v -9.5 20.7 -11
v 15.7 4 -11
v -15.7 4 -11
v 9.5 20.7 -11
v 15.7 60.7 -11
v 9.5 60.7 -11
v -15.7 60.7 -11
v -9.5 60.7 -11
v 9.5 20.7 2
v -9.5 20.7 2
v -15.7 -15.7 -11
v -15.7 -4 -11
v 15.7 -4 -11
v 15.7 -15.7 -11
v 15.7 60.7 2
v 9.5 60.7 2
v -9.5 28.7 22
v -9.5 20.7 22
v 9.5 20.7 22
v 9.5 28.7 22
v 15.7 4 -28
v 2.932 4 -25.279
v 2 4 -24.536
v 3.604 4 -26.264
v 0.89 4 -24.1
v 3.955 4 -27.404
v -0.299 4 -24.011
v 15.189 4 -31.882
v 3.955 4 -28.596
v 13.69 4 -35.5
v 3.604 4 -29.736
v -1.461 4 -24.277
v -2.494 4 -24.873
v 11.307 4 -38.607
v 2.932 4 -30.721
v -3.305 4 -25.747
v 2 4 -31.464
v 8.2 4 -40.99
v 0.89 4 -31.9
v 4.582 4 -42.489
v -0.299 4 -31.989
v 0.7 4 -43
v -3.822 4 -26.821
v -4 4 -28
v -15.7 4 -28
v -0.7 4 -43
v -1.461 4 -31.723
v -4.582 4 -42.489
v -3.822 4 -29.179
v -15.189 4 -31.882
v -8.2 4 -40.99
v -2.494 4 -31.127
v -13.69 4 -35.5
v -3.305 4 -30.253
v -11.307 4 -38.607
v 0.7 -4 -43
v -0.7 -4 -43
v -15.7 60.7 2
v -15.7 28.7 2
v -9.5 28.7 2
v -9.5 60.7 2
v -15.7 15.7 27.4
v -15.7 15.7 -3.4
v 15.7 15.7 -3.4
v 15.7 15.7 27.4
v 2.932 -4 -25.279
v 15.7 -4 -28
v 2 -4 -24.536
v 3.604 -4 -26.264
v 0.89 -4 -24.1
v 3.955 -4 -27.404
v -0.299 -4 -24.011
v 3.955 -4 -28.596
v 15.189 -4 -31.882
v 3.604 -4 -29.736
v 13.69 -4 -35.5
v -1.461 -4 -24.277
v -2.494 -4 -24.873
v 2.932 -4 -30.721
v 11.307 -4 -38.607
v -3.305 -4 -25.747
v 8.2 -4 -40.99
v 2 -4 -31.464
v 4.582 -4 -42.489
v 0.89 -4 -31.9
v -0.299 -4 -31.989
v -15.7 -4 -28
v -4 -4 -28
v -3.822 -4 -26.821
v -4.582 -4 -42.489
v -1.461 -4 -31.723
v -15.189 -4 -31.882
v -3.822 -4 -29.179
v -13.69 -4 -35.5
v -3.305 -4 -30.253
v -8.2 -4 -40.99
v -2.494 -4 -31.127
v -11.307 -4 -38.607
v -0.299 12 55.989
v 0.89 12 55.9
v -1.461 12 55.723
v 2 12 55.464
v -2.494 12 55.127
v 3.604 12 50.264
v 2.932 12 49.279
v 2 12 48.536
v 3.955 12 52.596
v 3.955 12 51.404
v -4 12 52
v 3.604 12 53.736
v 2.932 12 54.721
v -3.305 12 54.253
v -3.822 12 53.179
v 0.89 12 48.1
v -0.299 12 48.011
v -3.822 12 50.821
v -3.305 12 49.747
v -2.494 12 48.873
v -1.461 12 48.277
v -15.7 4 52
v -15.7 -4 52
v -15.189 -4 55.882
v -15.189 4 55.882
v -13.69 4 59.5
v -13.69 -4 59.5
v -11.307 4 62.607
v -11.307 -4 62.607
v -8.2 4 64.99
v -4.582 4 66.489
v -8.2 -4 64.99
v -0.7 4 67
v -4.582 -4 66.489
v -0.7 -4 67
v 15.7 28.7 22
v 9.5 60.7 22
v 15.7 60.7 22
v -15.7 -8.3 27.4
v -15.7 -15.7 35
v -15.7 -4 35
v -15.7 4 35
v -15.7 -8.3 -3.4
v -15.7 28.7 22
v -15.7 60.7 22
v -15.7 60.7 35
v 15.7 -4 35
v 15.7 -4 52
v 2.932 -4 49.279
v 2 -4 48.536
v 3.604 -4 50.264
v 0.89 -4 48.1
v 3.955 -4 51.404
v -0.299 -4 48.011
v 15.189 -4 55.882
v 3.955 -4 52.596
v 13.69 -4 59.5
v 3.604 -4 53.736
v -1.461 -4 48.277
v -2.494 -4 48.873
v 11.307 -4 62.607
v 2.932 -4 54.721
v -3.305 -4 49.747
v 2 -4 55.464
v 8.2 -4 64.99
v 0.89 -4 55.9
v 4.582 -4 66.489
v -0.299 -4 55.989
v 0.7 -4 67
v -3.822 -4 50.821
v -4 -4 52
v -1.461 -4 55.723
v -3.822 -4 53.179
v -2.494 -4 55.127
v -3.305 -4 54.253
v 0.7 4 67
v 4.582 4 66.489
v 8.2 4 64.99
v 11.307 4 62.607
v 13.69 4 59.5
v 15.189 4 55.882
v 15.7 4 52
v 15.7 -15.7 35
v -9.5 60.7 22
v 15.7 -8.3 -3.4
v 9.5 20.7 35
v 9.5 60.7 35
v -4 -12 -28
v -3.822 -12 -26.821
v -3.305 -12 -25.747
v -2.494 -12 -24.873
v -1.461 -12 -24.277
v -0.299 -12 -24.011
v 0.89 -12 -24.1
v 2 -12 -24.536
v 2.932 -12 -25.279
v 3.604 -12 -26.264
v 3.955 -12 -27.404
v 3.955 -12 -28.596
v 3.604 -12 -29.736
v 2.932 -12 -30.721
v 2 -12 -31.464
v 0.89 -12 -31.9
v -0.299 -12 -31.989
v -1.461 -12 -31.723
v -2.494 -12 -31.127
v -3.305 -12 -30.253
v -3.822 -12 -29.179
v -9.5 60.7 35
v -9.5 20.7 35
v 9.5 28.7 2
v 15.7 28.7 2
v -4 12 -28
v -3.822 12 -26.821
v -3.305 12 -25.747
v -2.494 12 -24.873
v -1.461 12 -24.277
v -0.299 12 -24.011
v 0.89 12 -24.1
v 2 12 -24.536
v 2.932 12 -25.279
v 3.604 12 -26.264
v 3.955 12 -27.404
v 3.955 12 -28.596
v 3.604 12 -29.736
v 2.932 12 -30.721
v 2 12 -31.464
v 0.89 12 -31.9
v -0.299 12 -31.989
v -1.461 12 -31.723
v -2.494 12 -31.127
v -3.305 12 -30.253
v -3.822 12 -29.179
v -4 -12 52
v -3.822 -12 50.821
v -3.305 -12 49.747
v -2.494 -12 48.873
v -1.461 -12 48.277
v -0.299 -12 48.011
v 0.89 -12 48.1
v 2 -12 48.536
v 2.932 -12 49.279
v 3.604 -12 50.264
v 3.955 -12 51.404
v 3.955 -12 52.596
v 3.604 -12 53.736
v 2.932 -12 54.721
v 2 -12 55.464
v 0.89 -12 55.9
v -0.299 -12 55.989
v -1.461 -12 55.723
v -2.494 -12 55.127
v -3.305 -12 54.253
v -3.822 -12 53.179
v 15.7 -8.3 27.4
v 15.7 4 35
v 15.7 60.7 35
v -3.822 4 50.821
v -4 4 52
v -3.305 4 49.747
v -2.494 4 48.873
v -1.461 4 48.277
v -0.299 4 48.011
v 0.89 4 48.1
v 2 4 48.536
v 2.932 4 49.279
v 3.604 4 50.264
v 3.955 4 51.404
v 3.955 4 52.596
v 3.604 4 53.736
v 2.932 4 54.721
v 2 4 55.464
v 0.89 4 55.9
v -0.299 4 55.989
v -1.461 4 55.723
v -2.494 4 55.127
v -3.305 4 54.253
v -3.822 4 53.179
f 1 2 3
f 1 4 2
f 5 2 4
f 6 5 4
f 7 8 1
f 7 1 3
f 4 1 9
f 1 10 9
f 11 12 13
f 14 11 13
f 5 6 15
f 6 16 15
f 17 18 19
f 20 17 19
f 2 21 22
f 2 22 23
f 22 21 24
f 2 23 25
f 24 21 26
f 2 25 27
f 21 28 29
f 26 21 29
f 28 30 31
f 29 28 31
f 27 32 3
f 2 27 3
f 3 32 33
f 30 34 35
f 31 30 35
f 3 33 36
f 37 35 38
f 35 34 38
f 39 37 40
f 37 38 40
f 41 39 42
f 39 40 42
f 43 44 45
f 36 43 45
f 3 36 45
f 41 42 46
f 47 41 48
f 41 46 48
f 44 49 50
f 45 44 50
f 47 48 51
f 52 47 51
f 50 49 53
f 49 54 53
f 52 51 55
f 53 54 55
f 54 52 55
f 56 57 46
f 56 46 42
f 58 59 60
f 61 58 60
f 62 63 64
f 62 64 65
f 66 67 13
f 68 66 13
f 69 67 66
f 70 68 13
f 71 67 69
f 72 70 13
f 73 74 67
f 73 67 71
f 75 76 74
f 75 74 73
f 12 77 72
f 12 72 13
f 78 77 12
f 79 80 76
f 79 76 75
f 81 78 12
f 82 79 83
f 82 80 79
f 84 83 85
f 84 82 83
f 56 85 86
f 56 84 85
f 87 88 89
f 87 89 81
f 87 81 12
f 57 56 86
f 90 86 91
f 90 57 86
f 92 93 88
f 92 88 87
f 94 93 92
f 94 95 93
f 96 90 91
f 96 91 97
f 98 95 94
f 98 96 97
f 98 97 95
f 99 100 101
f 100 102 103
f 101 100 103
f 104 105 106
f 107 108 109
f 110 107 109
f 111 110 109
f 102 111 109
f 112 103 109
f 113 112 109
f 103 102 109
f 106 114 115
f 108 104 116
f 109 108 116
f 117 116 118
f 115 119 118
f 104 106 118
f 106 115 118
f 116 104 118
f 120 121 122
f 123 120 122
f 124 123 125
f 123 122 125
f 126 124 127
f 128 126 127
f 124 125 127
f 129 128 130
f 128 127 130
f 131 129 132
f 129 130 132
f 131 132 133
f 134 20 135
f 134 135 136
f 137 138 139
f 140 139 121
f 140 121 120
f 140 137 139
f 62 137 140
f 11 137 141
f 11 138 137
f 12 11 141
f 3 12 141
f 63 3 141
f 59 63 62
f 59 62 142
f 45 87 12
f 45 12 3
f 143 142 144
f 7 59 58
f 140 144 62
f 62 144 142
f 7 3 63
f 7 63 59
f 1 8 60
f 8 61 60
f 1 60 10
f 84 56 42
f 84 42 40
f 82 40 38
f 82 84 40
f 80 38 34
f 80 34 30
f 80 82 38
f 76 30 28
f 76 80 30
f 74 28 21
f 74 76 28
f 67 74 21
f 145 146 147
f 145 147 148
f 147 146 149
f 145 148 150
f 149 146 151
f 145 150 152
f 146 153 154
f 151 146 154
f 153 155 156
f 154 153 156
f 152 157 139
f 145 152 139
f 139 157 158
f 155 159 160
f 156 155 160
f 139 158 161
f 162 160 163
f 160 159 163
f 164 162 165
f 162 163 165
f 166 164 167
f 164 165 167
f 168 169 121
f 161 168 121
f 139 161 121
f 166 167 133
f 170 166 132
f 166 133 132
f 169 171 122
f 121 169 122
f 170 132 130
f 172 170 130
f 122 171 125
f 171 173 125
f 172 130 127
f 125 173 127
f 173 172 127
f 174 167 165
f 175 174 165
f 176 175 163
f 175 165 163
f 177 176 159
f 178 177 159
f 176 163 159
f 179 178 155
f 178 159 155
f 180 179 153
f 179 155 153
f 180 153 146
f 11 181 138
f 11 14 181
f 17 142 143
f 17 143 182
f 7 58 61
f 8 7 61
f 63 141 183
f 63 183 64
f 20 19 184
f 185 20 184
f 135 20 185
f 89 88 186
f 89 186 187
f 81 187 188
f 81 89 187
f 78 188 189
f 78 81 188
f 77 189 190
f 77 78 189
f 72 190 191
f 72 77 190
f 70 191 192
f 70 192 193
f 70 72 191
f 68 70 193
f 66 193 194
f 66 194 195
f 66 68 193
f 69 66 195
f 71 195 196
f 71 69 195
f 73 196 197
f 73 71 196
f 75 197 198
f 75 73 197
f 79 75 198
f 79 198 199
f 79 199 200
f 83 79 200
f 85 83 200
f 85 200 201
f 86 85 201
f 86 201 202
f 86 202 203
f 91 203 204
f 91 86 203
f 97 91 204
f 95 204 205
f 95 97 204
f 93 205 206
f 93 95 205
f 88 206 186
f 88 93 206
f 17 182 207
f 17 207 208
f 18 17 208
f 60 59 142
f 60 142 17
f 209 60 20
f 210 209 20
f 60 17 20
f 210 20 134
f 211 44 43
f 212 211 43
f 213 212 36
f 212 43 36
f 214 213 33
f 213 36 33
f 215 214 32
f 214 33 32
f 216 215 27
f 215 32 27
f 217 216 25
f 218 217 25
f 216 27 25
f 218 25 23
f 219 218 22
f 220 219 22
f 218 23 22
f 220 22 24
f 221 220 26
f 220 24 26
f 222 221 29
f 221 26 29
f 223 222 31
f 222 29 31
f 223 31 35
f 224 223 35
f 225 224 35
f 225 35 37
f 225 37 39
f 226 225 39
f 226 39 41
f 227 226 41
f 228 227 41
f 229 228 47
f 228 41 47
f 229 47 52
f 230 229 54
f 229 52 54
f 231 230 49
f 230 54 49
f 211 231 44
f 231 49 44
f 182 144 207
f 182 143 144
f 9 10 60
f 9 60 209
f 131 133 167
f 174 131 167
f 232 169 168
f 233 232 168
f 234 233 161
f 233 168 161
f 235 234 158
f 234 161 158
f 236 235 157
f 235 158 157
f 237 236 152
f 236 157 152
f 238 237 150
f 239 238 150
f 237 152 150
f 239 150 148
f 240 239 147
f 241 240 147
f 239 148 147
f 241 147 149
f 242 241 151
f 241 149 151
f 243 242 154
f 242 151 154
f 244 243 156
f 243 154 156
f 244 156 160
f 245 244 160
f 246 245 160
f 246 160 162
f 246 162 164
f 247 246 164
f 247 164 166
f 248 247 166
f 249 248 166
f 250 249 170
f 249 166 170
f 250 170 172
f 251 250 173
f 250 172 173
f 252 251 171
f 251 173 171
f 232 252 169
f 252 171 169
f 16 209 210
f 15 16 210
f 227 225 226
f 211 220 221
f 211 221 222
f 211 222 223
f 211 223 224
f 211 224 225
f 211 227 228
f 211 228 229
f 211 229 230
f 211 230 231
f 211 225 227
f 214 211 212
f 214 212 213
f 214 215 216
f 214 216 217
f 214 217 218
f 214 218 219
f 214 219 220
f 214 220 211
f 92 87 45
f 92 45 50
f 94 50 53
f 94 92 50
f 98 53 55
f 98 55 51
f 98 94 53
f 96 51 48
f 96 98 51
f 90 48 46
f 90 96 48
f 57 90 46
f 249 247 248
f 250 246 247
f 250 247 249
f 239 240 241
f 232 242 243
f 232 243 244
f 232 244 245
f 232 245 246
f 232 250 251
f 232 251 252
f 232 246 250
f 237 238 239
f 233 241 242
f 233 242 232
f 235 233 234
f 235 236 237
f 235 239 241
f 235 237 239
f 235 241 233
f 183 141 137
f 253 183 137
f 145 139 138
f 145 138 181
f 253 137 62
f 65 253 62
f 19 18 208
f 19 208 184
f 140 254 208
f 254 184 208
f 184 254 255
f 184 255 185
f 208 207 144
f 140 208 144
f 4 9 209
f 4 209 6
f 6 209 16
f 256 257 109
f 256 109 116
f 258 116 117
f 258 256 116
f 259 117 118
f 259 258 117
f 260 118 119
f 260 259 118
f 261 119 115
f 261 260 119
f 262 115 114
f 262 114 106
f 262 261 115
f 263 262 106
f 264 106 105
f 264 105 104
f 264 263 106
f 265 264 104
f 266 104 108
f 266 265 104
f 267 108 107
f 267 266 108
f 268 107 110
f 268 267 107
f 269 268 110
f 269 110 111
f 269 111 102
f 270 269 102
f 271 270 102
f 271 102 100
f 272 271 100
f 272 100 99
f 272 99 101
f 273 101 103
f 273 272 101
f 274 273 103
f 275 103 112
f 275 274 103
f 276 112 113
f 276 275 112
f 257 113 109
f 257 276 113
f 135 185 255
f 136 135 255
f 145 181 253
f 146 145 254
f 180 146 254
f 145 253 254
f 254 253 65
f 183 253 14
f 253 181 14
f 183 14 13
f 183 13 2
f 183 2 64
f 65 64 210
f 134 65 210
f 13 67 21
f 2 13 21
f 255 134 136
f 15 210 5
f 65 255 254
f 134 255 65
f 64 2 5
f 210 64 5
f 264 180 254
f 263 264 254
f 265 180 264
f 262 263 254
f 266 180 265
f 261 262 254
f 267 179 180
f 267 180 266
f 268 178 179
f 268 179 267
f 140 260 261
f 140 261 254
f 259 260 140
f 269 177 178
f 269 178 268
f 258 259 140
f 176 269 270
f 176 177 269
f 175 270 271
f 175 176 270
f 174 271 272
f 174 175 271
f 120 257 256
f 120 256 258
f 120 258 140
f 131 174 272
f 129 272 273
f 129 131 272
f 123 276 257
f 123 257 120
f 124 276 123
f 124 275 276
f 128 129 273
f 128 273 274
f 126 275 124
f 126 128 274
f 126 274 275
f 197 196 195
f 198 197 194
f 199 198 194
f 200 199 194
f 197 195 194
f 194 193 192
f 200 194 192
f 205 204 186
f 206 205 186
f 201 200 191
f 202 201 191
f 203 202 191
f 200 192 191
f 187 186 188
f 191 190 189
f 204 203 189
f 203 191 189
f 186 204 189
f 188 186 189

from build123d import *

# Parameters (mm, degrees)
SKETCH4_W               = 31.4
SKETCH4_H               = 31.4
SKETCH4_W_2             = 25.4
SKETCH4_H_2             = 25.4
BOSS_EXTRUDE3_DEPTH     = 30
SKETCH5_W               = 31.4
SKETCH5_H               = 31.4
BOSS_EXTRUDE4_DEPTH     = 5
SKETCH6_W               = 31.4
SKETCH6_H               = 8
BOSS_EXTRUDE5_DEPTH     = 5
BOSS_EXTRUDE6_DEPTH     = 8
SKETCH8_R               = 4
BOSS_EXTRUDE7_DEPTH     = 8
SKETCH9_W               = 31.4
SKETCH9_H               = 10
BOSS_EXTRUDE8_DEPTH     = 5
SKETCH10_W              = 31.4
SKETCH10_H              = 10
BOSS_EXTRUDE9_DEPTH     = 13
SKETCH11_W              = 6.2
SKETCH11_H              = 10
BOSS_EXTRUDE10_DEPTH    = 40
BOSS_EXTRUDE11_DEPTH    = 3
SKETCH13_W              = 31.4
SKETCH13_H              = 31.4
CUT_EXTRUDE1_DEPTH      = 31.4
SKETCH14_W              = 31.4
SKETCH14_H              = 31.4
BOSS_EXTRUDE12_DEPTH    = 4
SKETCH16_W              = 31.4
SKETCH16_H              = 8
BOSS_EXTRUDE13_DEPTH    = 15.4
MIRROR2_COPY_1_SKETCH_R = 4
MIRROR2_COPY_1_DEPTH    = 8
SKETCH17_W              = 30.8
SKETCH17_H              = 24
CUT_EXTRUDE2_DEPTH      = 31.4


with BuildPart() as part:
    # Sketch4 → Boss-Extrude3 (new body)
    with BuildSketch(Plane.XY):
        Rectangle(SKETCH4_W, SKETCH4_H)
        Rectangle(SKETCH4_W_2, SKETCH4_H_2, mode=Mode.SUBTRACT)
    boss_extrude3 = extrude(amount=BOSS_EXTRUDE3_DEPTH)

    # Sketch5 → Boss-Extrude4 (add)
    with BuildSketch(Plane.XY.offset(30)):
        Rectangle(SKETCH5_W, SKETCH5_H)
    boss_extrude4 = extrude(amount=BOSS_EXTRUDE4_DEPTH)

    # Sketch6 → Boss-Extrude5 (add)
    with BuildSketch(Plane.XY.offset(35)):
        Rectangle(SKETCH6_W, SKETCH6_H)
    boss_extrude5 = extrude(amount=BOSS_EXTRUDE5_DEPTH)

    # Sketch7 → Boss-Extrude6 (add)
    with BuildSketch(Plane.XZ.offset(4)):
        with BuildLine():
            Line((-15.7, 40), (-15.7, 52))
            ThreePointArc((-15.7, 52), (-11.306601718, 62.606601718), (-0.7, 67))
            Line((-0.7, 67), (0.7, 67))
            ThreePointArc((0.7, 67), (11.306601718, 62.606601718), (15.7, 52))
            Line((15.7, 52), (15.7, 40))
            Line((15.7, 40), (-15.7, 40))
        make_face()
    boss_extrude6 = extrude(amount=-BOSS_EXTRUDE6_DEPTH)

    # Sketch8 → Boss-Extrude7 (add)
    with BuildSketch(Plane.XZ.offset(4)):
        with Locations(Location((0, 52, 0), (0, 0, 180))):
            Circle(SKETCH8_R)
    boss_extrude7 = extrude(amount=BOSS_EXTRUDE7_DEPTH)

    # Mirror1: Boss-Extrude7 across plane
    add(boss_extrude7.mirror(Plane.ZX))

    # Sketch9 → Boss-Extrude8 (add)
    with BuildSketch(Plane(origin=(0, 15.7, 0), x_dir=(1, 0, 0), z_dir=(0, 1, 0))):
        with Locations((0, -27)):
            Rectangle(SKETCH9_W, SKETCH9_H)
    boss_extrude8 = extrude(amount=BOSS_EXTRUDE8_DEPTH)

    # Sketch10 → Boss-Extrude9 (add)
    with BuildSketch(Plane(origin=(0, 15.7, 0), x_dir=(1, 0, 0), z_dir=(0, 1, 0))):
        with Locations((0, -17)):
            Rectangle(SKETCH10_W, SKETCH10_H)
    boss_extrude9 = extrude(amount=BOSS_EXTRUDE9_DEPTH)

    # Sketch11 → Boss-Extrude10 (add)
    with BuildSketch(Plane(origin=(0, 20.7, 0), x_dir=(1, 0, 0), z_dir=(0, 1, 0))):
        with Locations((-12.6, -27)):
            Rectangle(SKETCH11_W, SKETCH11_H)
        with Locations((12.6, -27)):
            Rectangle(SKETCH11_W, SKETCH11_H)
    boss_extrude10 = extrude(amount=BOSS_EXTRUDE10_DEPTH)

    # Sketch12 → Boss-Extrude11 (add)
    with BuildSketch(Plane.XY.offset(32)):
        Polygon((-15.7, 60.7), (-9.5, 60.7), (-9.5, 20.7), (9.5, 20.7), (9.5, 60.7), (15.7, 60.7), (15.7, 15.7), (-15.7, 15.7), align=None)
    boss_extrude11 = extrude(amount=BOSS_EXTRUDE11_DEPTH)

    # Sketch13 → Cut-Extrude1 (cut)
    with BuildSketch(Plane.ZY.offset(15.7)):
        with Locations((15.7, 0)):
            Rectangle(SKETCH13_W, SKETCH13_H)
    extrude(amount=-CUT_EXTRUDE1_DEPTH, mode=Mode.SUBTRACT)

    # Sketch14 → Boss-Extrude12 (add)
    with BuildSketch(Plane(origin=(0, 0, 31.4), x_dir=(-1, 0, 0), z_dir=(0, 0, -1))):
        Rectangle(SKETCH14_W, SKETCH14_H)
    boss_extrude12 = extrude(amount=BOSS_EXTRUDE12_DEPTH)

    # Sketch16 → Boss-Extrude13 (add)
    with BuildSketch(Plane(origin=(0, 0, 27.4), x_dir=(-1, 0, 0), z_dir=(0, 0, -1))):
        with Locations((0, -11.7)):
            Rectangle(SKETCH16_W, SKETCH16_H)
    boss_extrude13 = extrude(amount=BOSS_EXTRUDE13_DEPTH)

    # Mirror2: Boss-Extrude3, Boss-Extrude4, Boss-Extrude5, Boss-Extrude6, Boss-Extrude7, Boss-Extrude8, Boss-Extrude9, Boss-Extrude10, Boss-Extrude11, Boss-Extrude12, Boss-Extrude13 across plane
    add(boss_extrude3.mirror(Plane(origin=(-15.7, 28.7, 12), x_dir=(1, 0, 0), z_dir=(0, 0, 1))))
    add(boss_extrude4.mirror(Plane(origin=(-15.7, 28.7, 12), x_dir=(1, 0, 0), z_dir=(0, 0, 1))))
    add(boss_extrude5.mirror(Plane(origin=(-15.7, 28.7, 12), x_dir=(1, 0, 0), z_dir=(0, 0, 1))))
    add(boss_extrude6.mirror(Plane(origin=(-15.7, 28.7, 12), x_dir=(1, 0, 0), z_dir=(0, 0, 1))))
    add(boss_extrude7.mirror(Plane(origin=(-15.7, 28.7, 12), x_dir=(1, 0, 0), z_dir=(0, 0, 1))))
    add(boss_extrude8.mirror(Plane(origin=(-15.7, 28.7, 12), x_dir=(1, 0, 0), z_dir=(0, 0, 1))))
    add(boss_extrude9.mirror(Plane(origin=(-15.7, 28.7, 12), x_dir=(1, 0, 0), z_dir=(0, 0, 1))))
    add(boss_extrude10.mirror(Plane(origin=(-15.7, 28.7, 12), x_dir=(1, 0, 0), z_dir=(0, 0, 1))))
    add(boss_extrude11.mirror(Plane(origin=(-15.7, 28.7, 12), x_dir=(1, 0, 0), z_dir=(0, 0, 1))))
    add(boss_extrude12.mirror(Plane(origin=(-15.7, 28.7, 12), x_dir=(1, 0, 0), z_dir=(0, 0, 1))))
    add(boss_extrude13.mirror(Plane(origin=(-15.7, 28.7, 12), x_dir=(1, 0, 0), z_dir=(0, 0, 1))))

    # Mirror2 copy 1 sketch → Mirror2 copy 1 (add)
    with BuildSketch(Plane(origin=(0, 4, 24), x_dir=(1, 0, 0), z_dir=(0, 1, 0))):
        with Locations(Location((0, 52, 0), (0, 0, 180))):
            Circle(MIRROR2_COPY_1_SKETCH_R)
    extrude(amount=MIRROR2_COPY_1_DEPTH)

    # Sketch17 → Cut-Extrude2 (cut)
    with BuildSketch(Plane.ZY.offset(15.7)):
        with Locations((12, 3.7)):
            Rectangle(SKETCH17_W, SKETCH17_H)
    extrude(amount=-CUT_EXTRUDE2_DEPTH, mode=Mode.SUBTRACT)


solid = part.part
